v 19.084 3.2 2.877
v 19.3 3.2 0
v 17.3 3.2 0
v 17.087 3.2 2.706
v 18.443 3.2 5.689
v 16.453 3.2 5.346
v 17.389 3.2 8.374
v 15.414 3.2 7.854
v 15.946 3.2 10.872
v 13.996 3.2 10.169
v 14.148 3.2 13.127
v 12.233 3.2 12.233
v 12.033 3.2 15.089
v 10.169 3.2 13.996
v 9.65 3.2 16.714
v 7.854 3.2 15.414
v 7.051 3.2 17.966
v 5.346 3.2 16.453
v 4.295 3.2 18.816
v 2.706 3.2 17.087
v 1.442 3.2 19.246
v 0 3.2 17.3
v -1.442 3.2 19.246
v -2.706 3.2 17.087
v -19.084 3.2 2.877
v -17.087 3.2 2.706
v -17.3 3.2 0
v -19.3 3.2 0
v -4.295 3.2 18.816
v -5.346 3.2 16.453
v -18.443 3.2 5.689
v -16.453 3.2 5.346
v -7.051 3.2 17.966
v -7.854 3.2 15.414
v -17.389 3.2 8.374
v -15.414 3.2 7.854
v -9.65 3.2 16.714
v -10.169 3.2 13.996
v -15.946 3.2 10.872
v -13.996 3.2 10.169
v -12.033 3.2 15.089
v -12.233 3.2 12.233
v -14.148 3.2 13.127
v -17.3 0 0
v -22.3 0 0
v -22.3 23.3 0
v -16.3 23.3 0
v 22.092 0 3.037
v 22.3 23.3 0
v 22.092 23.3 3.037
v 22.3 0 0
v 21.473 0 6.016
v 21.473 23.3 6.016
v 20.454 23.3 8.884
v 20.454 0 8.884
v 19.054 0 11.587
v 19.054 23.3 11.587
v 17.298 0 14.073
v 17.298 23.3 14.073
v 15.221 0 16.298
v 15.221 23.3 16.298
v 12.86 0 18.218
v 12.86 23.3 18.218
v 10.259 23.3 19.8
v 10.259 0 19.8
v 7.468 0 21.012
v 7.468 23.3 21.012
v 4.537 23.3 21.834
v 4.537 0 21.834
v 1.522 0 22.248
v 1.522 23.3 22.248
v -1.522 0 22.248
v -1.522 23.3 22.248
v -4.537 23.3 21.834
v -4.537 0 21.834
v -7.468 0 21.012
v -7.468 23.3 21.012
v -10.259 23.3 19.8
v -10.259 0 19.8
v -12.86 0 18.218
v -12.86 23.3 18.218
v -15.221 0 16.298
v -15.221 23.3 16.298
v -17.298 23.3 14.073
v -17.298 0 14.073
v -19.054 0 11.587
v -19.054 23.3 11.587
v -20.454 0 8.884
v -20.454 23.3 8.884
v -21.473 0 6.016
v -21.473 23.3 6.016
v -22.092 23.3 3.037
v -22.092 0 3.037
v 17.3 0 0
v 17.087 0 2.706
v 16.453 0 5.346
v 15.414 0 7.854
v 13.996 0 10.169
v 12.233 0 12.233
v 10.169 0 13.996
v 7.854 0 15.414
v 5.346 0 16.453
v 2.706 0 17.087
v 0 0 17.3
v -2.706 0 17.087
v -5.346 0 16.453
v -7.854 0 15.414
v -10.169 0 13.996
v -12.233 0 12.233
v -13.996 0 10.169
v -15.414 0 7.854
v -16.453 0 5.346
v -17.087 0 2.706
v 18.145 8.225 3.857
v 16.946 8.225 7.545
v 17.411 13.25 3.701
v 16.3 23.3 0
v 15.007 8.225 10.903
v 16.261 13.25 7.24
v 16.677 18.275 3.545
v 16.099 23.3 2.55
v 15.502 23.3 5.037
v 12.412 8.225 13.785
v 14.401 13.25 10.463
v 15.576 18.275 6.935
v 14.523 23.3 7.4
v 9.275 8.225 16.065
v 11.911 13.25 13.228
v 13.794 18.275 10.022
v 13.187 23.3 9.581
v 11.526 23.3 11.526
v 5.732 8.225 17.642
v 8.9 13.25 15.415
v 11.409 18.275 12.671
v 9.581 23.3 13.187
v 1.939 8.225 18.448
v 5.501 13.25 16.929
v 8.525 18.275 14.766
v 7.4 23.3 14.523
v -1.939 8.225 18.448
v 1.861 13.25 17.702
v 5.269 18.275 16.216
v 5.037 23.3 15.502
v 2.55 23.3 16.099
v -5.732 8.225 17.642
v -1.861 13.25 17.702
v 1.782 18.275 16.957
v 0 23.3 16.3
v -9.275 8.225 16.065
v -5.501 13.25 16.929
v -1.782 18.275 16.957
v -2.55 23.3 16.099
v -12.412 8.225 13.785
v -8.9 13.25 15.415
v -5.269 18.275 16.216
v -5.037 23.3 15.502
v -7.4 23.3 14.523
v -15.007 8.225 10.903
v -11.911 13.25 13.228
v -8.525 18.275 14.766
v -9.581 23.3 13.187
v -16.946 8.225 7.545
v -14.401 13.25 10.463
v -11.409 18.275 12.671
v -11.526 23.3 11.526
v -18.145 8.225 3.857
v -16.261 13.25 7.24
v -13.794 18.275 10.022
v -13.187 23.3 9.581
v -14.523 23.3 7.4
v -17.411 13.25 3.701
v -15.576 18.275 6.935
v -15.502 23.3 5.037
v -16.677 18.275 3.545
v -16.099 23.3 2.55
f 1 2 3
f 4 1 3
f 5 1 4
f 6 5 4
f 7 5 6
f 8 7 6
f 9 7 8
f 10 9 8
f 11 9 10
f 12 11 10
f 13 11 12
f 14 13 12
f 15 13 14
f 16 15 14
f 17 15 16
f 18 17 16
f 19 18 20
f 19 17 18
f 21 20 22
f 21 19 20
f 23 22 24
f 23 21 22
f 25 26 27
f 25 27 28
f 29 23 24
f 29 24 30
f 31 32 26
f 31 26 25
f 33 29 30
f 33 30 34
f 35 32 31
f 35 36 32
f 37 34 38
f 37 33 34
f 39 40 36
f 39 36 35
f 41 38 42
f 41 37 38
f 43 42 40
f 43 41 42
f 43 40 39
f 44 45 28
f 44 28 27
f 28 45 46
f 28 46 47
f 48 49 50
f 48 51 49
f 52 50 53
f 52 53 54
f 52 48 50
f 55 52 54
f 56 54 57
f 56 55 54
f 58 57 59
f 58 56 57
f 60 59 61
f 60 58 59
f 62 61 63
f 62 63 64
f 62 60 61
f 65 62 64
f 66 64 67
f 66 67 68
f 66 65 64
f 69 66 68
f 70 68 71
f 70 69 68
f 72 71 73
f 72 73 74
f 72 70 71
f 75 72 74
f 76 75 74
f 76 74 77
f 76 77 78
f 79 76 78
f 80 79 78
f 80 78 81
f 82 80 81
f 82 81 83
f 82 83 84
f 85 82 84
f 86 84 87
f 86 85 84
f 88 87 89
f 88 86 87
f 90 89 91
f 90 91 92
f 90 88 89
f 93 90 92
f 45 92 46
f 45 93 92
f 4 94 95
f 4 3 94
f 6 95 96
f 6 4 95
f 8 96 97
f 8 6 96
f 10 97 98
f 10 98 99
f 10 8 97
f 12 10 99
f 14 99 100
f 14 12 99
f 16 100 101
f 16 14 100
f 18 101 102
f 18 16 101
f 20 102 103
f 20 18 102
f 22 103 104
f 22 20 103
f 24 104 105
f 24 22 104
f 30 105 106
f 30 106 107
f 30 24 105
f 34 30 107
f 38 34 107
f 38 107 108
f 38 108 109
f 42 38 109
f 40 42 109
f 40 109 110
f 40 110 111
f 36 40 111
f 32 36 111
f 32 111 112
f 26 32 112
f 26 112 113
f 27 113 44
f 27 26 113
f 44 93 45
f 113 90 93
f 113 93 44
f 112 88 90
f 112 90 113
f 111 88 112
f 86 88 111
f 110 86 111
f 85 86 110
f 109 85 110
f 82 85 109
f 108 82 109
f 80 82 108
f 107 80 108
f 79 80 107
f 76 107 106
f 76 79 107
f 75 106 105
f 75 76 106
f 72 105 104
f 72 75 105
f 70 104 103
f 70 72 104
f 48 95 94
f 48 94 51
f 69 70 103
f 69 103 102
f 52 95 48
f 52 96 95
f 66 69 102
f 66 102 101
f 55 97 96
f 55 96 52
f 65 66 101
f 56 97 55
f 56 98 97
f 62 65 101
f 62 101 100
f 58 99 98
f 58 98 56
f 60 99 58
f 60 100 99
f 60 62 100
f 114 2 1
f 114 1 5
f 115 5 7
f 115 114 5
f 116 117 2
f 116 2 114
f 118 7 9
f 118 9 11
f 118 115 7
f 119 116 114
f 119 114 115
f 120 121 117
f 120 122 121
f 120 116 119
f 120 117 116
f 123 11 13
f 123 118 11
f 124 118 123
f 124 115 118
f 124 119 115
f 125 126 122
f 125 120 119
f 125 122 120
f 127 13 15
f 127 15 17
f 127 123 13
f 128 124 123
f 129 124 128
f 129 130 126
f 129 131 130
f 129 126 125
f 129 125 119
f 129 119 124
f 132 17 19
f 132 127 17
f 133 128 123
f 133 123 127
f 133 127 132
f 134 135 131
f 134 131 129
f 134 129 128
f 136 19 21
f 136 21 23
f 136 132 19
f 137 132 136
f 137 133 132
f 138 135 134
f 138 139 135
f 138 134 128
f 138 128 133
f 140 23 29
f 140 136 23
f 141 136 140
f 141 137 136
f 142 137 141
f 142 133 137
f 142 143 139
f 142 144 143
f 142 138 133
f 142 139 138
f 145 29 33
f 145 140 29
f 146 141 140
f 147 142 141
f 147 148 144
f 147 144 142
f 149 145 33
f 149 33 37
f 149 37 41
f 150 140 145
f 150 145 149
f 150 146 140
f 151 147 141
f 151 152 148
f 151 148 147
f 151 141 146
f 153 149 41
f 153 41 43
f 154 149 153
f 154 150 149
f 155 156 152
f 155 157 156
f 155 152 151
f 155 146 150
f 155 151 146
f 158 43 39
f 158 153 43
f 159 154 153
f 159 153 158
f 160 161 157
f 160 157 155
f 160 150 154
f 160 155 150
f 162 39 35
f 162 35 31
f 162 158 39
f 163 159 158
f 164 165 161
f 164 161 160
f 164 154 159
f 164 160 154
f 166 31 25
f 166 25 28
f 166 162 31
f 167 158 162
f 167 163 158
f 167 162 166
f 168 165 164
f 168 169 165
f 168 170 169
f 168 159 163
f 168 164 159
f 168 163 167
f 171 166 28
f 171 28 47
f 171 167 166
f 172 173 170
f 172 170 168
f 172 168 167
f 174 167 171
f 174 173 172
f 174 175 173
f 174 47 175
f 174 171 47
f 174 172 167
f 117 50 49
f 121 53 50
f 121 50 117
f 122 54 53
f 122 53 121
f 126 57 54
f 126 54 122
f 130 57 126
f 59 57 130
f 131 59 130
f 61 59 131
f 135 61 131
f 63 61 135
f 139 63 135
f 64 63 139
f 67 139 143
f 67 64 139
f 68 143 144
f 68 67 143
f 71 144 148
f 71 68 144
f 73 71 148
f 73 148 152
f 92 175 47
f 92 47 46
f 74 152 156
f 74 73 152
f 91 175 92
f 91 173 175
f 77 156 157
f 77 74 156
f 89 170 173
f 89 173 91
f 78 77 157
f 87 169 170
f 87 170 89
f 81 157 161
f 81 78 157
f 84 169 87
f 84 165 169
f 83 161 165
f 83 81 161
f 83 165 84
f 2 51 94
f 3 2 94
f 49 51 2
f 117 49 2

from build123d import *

# Parameters (mm, degrees)
REVOLUTION_ANGLE = -180


with BuildPart() as part:
    # Sketch → Revolution (revolve)
    with BuildSketch(Plane.XY):
        Polygon((17.3, 0), (17.3, 3.2), (19.3, 3.2), (16.3, 23.3), (22.3, 23.3), (22.3, 0), align=None)
    revolve(axis=Axis((0, 0, 0), (0, 1, 0)), revolution_arc=REVOLUTION_ANGLE)


solid = part.part
